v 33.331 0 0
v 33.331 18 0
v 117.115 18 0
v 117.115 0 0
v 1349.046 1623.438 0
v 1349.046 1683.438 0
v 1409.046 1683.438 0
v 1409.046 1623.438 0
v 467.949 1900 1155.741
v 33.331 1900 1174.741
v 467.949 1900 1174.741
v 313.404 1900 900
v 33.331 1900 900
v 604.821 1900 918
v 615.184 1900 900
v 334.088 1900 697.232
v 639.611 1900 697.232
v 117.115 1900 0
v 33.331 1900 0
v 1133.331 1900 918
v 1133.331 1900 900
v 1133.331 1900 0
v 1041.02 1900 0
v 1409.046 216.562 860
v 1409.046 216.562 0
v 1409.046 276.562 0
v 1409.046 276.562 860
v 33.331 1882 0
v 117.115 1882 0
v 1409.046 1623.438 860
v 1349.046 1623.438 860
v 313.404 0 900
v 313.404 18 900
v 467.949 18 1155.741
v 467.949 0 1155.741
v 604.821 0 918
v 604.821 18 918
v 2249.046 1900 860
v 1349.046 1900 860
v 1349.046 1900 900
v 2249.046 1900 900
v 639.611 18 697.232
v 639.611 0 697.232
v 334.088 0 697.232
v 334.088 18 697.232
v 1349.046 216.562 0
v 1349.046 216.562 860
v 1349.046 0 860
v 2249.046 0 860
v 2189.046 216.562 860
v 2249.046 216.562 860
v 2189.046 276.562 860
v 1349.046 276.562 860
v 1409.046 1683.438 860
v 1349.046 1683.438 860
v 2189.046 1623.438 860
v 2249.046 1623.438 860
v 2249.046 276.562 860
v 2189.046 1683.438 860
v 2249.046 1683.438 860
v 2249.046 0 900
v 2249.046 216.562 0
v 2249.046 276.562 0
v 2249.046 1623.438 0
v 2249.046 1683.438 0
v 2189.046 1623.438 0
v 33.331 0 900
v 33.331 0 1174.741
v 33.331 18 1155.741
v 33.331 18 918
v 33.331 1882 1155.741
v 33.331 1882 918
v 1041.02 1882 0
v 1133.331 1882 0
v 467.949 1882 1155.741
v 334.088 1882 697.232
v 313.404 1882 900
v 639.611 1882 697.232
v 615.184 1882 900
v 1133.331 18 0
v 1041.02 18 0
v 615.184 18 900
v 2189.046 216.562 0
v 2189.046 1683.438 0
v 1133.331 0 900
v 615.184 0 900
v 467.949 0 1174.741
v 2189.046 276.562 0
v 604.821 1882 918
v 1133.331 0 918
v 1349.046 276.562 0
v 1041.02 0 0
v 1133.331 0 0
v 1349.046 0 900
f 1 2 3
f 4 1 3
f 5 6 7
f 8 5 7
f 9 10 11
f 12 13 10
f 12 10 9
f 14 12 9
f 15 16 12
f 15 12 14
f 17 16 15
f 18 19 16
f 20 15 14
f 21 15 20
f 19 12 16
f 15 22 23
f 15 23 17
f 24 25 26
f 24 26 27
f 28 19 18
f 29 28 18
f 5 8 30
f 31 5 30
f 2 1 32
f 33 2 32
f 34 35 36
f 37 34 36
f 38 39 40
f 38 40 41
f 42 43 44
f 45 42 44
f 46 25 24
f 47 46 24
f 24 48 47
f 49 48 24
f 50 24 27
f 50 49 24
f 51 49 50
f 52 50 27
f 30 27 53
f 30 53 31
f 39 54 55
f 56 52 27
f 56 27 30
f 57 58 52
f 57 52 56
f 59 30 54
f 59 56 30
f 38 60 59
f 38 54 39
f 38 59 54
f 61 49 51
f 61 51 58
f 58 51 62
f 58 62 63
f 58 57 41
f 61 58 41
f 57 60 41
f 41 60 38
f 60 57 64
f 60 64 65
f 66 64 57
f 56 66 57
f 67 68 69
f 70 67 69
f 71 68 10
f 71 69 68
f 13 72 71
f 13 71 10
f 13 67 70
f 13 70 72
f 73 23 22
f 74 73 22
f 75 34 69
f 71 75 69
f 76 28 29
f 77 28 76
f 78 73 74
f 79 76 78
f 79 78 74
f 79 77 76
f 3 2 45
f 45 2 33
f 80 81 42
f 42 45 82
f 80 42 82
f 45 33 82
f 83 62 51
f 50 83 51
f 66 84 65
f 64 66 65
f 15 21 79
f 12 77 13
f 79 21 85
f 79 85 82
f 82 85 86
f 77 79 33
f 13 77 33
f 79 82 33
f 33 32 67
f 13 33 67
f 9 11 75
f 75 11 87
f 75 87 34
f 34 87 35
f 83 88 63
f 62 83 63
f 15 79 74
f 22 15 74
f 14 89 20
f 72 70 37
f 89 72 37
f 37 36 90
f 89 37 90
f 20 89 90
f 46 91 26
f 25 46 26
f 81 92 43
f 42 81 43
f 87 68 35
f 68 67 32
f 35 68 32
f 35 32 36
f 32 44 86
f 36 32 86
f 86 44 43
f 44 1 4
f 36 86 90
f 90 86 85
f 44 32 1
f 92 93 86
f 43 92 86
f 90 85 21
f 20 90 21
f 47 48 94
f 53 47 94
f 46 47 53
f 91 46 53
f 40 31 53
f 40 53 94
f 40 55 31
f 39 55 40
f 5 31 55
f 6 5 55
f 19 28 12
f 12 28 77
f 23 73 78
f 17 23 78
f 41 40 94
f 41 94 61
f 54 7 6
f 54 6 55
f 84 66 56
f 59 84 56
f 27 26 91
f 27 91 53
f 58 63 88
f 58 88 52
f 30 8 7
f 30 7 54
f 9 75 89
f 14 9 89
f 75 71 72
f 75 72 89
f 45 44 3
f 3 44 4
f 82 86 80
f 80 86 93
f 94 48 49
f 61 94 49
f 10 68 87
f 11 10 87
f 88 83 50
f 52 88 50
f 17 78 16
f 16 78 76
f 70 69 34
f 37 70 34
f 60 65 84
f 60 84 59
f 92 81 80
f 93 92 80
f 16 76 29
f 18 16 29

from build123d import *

# Parameters (mm, degrees)
F0_W     = 1100
F0_H     = 1900
F1_DEPTH = 1500
F0_W_2   = 900
F2_DEPTH = 900
F3_W     = 780
F3_H     = 860
F4_DEPTH = 1900
F5_START = -18
F5_DEPTH = 1864
F8_W     = 216.5617644787
F8_H     = 860
F8_W_2   = 1346.8764710426
F9_DEPTH = 900


# Not quite as in the source:
# - a feature of the source that left no trace in its solid (it failed there, or was rolled back) is left out


with BuildPart() as f1:
    # F0 (on Top) → F1 (new body)
    with BuildSketch(Plane.XY):
        with Locations((583.3312265575, 950)):
            Rectangle(F0_W, F0_H)
    extrude(amount=F1_DEPTH)


with BuildPart() as f2:
    # F0 (on Top) → F2 (new body)
    with BuildSketch(Plane.XY):
        with Locations((1799.0458726883, 950)):
            Rectangle(F0_W_2, F0_H)
    extrude(amount=F2_DEPTH)


with BuildPart() as f4_tool:
    # F3 (on face) → F4 (new body, through all)
    with BuildSketch(Plane.XZ):
        Polygon((33.3312265575, 900), (33.3312265575, 0), (313.4037852287, 900), align=None)
        Polygon((334.0880279243, 697.2315277786), (117.1153412896, 0), (1041.0203720349, 0), (639.6110557539, 697.2315277786), align=None)
        Polygon((615.1842835989, 900), (1133.3312265575, 0), (1133.3312265575, 900), (769.4745531541, 900), align=None)
        Polygon((33.3312265575, 1500), (33.3312265575, 1174.7411898097), (467.9492661672, 1174.7411898097), (467.9492661672, 1155.7411898097), (604.8213447397, 918), (1133.3312265575, 918), (1133.3312265575, 1500), align=None)
        with Locations((1799.0458726883, 430)):
            Rectangle(F3_W, F3_H)
    extrude(amount=-F4_DEPTH)


with BuildPart() as f1_1:
    add(f1.part)

    # F4: cut by f4_tool
    add(f4_tool.part, mode=Mode.SUBTRACT)

    # F3 (on face) → F5 (cut)
    with BuildSketch(Plane.XZ.offset(F5_START)):
        Polygon((313.4037852287, 900), (33.3312265575, 0), (117.1153412896, 0), (334.0880279243, 697.2315277786), (397.1878999609, 900), align=None)
        Polygon((522.8734290762, 900), (397.1878999609, 900), (334.0880279243, 697.2315277786), (639.6110557539, 697.2315277786), align=None)
        Polygon((33.3312265575, 1155.7411898097), (33.3312265575, 918), (512.5104902171, 918), (375.6384116446, 1155.7411898097), align=None)
        Polygon((639.6110557539, 697.2315277786), (1041.0203720349, 0), (1133.3312265575, 0), (615.1842835989, 900), (522.8734290762, 900), align=None)
        Polygon((375.6384116446, 1155.7411898097), (512.5104902171, 918), (584.0514024721, 918), (447.1793238996, 1155.7411898097), align=None)
        Polygon((447.1793238996, 1155.7411898097), (584.0514024721, 918), (604.8213447397, 918), (467.9492661672, 1155.7411898097), align=None)
    extrude(amount=-F5_DEPTH, mode=Mode.SUBTRACT)


with BuildPart() as f2_1:
    add(f2.part)

    # F4: cut by f4_tool
    add(f4_tool.part, mode=Mode.SUBTRACT)

    # F8 (on face) → F9 (cut, through all)
    with BuildSketch(Plane.YZ.offset(2249.0458726883)):
        with Locations((108.2808822393, 430)):
            Rectangle(F8_W, F8_H)
        with Locations((950, 430)):
            Rectangle(F8_W_2, F8_H)
        with Locations((1791.7191177607, 430)):
            Rectangle(F8_W, F8_H)
    extrude(amount=-F9_DEPTH, mode=Mode.SUBTRACT)


solid = Compound([f1_1.part, f2_1.part])
